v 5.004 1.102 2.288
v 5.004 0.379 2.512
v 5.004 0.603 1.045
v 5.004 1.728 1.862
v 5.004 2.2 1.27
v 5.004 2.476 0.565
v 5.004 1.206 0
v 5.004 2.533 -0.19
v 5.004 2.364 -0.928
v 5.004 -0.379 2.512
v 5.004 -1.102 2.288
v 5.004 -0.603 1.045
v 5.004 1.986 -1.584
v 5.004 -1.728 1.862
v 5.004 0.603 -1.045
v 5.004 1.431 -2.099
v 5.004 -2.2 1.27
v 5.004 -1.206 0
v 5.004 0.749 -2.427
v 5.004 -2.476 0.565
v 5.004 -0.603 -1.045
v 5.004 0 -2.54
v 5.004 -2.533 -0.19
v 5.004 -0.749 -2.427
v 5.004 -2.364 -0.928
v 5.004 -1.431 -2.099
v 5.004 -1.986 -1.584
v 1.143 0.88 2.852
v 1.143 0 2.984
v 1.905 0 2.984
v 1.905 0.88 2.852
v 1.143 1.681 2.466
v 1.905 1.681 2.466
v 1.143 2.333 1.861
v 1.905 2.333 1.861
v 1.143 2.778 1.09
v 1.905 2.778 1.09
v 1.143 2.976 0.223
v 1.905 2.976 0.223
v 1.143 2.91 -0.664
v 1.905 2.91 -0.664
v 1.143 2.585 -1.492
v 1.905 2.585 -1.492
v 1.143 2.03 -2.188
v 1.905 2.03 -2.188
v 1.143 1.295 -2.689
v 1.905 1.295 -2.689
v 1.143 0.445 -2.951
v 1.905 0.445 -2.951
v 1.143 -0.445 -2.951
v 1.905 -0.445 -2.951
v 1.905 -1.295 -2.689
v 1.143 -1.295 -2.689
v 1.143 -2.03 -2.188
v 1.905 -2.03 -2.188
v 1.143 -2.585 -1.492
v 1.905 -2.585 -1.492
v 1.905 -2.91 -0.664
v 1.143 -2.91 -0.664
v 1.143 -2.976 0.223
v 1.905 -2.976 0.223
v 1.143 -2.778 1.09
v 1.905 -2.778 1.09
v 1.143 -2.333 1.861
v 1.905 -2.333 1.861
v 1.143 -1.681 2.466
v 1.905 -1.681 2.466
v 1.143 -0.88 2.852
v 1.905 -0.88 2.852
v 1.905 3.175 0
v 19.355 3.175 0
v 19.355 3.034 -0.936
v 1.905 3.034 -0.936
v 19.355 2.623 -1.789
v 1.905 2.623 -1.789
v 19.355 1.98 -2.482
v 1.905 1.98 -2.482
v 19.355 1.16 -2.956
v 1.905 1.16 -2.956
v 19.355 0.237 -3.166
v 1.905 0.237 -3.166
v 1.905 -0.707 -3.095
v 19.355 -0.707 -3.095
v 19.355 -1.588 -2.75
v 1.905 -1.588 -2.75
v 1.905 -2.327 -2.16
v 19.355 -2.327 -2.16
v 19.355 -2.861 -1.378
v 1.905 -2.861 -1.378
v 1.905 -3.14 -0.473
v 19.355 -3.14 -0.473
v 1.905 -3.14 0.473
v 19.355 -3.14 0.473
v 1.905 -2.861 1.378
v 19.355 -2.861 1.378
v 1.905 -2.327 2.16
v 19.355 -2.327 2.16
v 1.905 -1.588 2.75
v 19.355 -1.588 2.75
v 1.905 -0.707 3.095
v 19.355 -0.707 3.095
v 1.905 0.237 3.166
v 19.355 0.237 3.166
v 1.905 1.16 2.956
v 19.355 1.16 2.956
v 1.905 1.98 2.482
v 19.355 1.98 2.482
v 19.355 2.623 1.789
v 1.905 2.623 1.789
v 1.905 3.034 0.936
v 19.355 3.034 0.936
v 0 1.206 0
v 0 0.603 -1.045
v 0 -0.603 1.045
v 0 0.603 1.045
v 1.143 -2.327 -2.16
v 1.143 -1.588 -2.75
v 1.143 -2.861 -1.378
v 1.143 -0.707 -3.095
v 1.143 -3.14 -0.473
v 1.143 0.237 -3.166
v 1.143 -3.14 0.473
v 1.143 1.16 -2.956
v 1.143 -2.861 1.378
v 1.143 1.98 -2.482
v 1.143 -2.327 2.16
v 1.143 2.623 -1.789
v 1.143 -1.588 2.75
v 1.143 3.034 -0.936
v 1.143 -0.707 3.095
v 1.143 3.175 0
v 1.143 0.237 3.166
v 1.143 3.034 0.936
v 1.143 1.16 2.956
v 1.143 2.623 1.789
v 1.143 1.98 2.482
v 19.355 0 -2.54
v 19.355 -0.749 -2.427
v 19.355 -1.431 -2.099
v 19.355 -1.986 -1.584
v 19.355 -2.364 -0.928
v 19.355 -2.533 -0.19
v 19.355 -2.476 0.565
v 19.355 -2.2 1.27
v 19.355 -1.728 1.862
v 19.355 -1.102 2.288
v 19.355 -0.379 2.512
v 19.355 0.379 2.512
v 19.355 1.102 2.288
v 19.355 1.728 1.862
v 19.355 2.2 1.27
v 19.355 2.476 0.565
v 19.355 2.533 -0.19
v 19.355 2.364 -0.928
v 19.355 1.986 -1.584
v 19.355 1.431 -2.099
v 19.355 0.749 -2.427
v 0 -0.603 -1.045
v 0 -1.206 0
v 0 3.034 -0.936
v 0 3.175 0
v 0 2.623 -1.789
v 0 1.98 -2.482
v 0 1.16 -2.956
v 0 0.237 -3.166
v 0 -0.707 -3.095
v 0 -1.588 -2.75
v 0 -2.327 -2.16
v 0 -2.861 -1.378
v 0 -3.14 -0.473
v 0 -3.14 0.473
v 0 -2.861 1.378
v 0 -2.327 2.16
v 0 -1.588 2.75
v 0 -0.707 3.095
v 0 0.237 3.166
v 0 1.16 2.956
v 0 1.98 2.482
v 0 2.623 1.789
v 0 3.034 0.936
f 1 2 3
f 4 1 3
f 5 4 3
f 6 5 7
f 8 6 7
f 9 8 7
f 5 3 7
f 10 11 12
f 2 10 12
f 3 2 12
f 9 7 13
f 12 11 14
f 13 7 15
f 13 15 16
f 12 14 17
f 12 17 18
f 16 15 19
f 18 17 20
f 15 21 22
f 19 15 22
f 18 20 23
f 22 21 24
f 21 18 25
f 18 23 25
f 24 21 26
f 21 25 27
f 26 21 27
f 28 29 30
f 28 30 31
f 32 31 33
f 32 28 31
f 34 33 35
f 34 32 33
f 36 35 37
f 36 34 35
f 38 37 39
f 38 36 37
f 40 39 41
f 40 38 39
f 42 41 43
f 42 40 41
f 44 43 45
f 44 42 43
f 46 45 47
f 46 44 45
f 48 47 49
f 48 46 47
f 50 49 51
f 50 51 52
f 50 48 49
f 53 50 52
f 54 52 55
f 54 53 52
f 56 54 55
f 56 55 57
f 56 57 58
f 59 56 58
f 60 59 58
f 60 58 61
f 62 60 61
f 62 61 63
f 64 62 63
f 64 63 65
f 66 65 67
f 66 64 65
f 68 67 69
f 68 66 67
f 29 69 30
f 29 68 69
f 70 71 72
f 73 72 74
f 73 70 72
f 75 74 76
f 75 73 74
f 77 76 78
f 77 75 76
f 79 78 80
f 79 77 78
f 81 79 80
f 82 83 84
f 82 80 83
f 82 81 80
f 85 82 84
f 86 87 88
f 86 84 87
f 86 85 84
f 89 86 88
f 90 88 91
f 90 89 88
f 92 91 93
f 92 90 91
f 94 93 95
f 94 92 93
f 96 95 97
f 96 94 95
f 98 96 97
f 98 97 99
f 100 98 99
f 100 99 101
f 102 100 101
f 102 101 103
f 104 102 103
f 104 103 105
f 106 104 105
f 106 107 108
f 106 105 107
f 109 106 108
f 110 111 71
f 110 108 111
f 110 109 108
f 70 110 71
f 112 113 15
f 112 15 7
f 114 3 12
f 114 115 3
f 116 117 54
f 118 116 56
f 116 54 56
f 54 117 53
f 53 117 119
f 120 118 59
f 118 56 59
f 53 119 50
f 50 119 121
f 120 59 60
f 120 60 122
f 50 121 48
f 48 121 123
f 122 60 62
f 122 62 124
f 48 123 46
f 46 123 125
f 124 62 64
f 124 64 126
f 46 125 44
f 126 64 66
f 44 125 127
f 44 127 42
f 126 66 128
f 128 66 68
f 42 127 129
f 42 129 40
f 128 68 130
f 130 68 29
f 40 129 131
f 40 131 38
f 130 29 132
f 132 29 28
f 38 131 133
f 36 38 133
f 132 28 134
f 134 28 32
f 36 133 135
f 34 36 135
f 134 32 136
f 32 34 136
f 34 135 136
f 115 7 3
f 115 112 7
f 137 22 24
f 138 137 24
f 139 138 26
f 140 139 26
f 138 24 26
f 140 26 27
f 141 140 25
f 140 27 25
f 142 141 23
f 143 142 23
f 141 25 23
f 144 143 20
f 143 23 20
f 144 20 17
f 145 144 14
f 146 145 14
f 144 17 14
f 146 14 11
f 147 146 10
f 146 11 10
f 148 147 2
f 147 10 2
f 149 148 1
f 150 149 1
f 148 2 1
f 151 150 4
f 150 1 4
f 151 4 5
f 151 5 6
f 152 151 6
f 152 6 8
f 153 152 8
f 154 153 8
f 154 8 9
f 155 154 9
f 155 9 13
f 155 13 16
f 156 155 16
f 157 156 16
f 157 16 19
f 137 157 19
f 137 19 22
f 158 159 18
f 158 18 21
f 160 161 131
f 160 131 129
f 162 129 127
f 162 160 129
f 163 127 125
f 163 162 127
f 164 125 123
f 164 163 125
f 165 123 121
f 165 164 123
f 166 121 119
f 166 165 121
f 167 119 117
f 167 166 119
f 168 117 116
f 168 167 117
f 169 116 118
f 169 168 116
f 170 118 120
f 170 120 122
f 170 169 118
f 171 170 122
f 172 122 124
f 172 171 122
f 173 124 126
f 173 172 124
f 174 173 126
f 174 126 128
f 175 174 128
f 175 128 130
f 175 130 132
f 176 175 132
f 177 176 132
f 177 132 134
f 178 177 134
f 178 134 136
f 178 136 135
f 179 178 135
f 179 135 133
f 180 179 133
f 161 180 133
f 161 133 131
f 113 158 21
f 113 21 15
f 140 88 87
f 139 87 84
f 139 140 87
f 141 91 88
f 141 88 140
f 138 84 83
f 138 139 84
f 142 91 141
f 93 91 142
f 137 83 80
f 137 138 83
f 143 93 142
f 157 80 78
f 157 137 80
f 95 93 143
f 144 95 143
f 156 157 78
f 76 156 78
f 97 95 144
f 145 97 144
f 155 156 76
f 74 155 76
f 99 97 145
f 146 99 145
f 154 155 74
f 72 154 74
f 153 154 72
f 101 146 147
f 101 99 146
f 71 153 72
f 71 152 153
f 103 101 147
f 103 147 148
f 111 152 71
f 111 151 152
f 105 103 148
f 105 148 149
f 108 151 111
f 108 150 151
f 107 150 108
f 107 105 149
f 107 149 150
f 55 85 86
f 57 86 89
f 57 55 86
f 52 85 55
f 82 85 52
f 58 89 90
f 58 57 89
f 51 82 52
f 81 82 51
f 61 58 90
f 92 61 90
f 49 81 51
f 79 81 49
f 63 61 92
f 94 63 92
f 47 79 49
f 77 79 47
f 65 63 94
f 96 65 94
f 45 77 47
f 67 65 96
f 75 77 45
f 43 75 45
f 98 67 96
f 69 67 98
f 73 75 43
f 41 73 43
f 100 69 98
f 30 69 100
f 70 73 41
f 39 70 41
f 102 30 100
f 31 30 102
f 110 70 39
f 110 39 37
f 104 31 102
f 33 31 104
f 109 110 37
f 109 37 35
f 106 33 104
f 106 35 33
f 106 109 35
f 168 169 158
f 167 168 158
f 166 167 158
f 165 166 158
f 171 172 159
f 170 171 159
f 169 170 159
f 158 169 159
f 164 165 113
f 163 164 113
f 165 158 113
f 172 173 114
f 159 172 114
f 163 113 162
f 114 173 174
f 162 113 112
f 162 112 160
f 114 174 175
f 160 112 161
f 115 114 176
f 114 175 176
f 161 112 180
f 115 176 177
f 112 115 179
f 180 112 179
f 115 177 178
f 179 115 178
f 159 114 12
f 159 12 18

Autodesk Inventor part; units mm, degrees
ref_plane "YZ Plane" through (0, 0, 0) normal (1, 0, 0) x (0, 1, 0)
ref_plane "XZ Plane" through (0, 0, 0) normal (0, 1, 0) x (-1, 0, 0)
ref_plane "XY Plane" through (0, 0, 0) normal (0, 0, 1) x (1, 0, 0)
sketch "Sketch1" plane through (0, 0, 0) normal (1, 0, 0) x (0, 1, 0)
  circle A0 centre (0, 0) radius 3.175
  dimension "d0" = 6.35
extrude "Extrusion1" add sketch "Sketch1" along normal blind 19.3548
ref_plane "Work Plane1" through (1.143, 0, 0) normal (-1, 0, 0) x (0, 0, 1)
sketch "Sketch2" plane through (1.143, 0, 0) normal (-1, 0, 0) x (0, 0, 1)
  circle A0 centre (0, 0) radius 3.175 projected
  circle A1 centre (0, 0) radius 2.9845
  dimension "d4" = 5.969
extrude "Extrusion2" cut sketch "Sketch2" against normal blind 0.762
sketch "Sketch3" plane through (19.3548, 0, 0) normal (1, 0, 0) x (0, 0, -1)
  circle A0 centre (0, 0) radius 3.175 projected
hole "Hole1" at (19.3548, 0, 0) direction (-1, 0, 0) diameter 5.08 depth 14.351
sketch "Sketch4" plane through (0, 0, 0) normal (-1, 0, 0) x (0, 0, 1)
  circle A0 centre (0, 0) radius 3.175 projected
  line L0 (0, 1.2065) -> (1.0449, 0.6033)
  line L1 (1.0449, 0.6033) -> (1.0449, -0.6033)
  line L2 (1.0449, -0.6033) -> (0, -1.2065)
  line L3 (0, -1.2065) -> (-1.0449, -0.6033)
  line L4 (-1.0449, -0.6033) -> (-1.0449, 0.6032)
  line L5 (-1.0449, 0.6032) -> (0, 1.2065)
  dimension "d15" = 2.413
extrude "Extrusion3" cut sketch "Sketch4" against normal through all contours L0 L1 L2 L3 L4 L5
thread "Thread1" size "12-24 UNC" class "2B" standard "ANSI Unified Screw Threads" full length
properties part number "Clutch Sleeve2" material "Steel"
